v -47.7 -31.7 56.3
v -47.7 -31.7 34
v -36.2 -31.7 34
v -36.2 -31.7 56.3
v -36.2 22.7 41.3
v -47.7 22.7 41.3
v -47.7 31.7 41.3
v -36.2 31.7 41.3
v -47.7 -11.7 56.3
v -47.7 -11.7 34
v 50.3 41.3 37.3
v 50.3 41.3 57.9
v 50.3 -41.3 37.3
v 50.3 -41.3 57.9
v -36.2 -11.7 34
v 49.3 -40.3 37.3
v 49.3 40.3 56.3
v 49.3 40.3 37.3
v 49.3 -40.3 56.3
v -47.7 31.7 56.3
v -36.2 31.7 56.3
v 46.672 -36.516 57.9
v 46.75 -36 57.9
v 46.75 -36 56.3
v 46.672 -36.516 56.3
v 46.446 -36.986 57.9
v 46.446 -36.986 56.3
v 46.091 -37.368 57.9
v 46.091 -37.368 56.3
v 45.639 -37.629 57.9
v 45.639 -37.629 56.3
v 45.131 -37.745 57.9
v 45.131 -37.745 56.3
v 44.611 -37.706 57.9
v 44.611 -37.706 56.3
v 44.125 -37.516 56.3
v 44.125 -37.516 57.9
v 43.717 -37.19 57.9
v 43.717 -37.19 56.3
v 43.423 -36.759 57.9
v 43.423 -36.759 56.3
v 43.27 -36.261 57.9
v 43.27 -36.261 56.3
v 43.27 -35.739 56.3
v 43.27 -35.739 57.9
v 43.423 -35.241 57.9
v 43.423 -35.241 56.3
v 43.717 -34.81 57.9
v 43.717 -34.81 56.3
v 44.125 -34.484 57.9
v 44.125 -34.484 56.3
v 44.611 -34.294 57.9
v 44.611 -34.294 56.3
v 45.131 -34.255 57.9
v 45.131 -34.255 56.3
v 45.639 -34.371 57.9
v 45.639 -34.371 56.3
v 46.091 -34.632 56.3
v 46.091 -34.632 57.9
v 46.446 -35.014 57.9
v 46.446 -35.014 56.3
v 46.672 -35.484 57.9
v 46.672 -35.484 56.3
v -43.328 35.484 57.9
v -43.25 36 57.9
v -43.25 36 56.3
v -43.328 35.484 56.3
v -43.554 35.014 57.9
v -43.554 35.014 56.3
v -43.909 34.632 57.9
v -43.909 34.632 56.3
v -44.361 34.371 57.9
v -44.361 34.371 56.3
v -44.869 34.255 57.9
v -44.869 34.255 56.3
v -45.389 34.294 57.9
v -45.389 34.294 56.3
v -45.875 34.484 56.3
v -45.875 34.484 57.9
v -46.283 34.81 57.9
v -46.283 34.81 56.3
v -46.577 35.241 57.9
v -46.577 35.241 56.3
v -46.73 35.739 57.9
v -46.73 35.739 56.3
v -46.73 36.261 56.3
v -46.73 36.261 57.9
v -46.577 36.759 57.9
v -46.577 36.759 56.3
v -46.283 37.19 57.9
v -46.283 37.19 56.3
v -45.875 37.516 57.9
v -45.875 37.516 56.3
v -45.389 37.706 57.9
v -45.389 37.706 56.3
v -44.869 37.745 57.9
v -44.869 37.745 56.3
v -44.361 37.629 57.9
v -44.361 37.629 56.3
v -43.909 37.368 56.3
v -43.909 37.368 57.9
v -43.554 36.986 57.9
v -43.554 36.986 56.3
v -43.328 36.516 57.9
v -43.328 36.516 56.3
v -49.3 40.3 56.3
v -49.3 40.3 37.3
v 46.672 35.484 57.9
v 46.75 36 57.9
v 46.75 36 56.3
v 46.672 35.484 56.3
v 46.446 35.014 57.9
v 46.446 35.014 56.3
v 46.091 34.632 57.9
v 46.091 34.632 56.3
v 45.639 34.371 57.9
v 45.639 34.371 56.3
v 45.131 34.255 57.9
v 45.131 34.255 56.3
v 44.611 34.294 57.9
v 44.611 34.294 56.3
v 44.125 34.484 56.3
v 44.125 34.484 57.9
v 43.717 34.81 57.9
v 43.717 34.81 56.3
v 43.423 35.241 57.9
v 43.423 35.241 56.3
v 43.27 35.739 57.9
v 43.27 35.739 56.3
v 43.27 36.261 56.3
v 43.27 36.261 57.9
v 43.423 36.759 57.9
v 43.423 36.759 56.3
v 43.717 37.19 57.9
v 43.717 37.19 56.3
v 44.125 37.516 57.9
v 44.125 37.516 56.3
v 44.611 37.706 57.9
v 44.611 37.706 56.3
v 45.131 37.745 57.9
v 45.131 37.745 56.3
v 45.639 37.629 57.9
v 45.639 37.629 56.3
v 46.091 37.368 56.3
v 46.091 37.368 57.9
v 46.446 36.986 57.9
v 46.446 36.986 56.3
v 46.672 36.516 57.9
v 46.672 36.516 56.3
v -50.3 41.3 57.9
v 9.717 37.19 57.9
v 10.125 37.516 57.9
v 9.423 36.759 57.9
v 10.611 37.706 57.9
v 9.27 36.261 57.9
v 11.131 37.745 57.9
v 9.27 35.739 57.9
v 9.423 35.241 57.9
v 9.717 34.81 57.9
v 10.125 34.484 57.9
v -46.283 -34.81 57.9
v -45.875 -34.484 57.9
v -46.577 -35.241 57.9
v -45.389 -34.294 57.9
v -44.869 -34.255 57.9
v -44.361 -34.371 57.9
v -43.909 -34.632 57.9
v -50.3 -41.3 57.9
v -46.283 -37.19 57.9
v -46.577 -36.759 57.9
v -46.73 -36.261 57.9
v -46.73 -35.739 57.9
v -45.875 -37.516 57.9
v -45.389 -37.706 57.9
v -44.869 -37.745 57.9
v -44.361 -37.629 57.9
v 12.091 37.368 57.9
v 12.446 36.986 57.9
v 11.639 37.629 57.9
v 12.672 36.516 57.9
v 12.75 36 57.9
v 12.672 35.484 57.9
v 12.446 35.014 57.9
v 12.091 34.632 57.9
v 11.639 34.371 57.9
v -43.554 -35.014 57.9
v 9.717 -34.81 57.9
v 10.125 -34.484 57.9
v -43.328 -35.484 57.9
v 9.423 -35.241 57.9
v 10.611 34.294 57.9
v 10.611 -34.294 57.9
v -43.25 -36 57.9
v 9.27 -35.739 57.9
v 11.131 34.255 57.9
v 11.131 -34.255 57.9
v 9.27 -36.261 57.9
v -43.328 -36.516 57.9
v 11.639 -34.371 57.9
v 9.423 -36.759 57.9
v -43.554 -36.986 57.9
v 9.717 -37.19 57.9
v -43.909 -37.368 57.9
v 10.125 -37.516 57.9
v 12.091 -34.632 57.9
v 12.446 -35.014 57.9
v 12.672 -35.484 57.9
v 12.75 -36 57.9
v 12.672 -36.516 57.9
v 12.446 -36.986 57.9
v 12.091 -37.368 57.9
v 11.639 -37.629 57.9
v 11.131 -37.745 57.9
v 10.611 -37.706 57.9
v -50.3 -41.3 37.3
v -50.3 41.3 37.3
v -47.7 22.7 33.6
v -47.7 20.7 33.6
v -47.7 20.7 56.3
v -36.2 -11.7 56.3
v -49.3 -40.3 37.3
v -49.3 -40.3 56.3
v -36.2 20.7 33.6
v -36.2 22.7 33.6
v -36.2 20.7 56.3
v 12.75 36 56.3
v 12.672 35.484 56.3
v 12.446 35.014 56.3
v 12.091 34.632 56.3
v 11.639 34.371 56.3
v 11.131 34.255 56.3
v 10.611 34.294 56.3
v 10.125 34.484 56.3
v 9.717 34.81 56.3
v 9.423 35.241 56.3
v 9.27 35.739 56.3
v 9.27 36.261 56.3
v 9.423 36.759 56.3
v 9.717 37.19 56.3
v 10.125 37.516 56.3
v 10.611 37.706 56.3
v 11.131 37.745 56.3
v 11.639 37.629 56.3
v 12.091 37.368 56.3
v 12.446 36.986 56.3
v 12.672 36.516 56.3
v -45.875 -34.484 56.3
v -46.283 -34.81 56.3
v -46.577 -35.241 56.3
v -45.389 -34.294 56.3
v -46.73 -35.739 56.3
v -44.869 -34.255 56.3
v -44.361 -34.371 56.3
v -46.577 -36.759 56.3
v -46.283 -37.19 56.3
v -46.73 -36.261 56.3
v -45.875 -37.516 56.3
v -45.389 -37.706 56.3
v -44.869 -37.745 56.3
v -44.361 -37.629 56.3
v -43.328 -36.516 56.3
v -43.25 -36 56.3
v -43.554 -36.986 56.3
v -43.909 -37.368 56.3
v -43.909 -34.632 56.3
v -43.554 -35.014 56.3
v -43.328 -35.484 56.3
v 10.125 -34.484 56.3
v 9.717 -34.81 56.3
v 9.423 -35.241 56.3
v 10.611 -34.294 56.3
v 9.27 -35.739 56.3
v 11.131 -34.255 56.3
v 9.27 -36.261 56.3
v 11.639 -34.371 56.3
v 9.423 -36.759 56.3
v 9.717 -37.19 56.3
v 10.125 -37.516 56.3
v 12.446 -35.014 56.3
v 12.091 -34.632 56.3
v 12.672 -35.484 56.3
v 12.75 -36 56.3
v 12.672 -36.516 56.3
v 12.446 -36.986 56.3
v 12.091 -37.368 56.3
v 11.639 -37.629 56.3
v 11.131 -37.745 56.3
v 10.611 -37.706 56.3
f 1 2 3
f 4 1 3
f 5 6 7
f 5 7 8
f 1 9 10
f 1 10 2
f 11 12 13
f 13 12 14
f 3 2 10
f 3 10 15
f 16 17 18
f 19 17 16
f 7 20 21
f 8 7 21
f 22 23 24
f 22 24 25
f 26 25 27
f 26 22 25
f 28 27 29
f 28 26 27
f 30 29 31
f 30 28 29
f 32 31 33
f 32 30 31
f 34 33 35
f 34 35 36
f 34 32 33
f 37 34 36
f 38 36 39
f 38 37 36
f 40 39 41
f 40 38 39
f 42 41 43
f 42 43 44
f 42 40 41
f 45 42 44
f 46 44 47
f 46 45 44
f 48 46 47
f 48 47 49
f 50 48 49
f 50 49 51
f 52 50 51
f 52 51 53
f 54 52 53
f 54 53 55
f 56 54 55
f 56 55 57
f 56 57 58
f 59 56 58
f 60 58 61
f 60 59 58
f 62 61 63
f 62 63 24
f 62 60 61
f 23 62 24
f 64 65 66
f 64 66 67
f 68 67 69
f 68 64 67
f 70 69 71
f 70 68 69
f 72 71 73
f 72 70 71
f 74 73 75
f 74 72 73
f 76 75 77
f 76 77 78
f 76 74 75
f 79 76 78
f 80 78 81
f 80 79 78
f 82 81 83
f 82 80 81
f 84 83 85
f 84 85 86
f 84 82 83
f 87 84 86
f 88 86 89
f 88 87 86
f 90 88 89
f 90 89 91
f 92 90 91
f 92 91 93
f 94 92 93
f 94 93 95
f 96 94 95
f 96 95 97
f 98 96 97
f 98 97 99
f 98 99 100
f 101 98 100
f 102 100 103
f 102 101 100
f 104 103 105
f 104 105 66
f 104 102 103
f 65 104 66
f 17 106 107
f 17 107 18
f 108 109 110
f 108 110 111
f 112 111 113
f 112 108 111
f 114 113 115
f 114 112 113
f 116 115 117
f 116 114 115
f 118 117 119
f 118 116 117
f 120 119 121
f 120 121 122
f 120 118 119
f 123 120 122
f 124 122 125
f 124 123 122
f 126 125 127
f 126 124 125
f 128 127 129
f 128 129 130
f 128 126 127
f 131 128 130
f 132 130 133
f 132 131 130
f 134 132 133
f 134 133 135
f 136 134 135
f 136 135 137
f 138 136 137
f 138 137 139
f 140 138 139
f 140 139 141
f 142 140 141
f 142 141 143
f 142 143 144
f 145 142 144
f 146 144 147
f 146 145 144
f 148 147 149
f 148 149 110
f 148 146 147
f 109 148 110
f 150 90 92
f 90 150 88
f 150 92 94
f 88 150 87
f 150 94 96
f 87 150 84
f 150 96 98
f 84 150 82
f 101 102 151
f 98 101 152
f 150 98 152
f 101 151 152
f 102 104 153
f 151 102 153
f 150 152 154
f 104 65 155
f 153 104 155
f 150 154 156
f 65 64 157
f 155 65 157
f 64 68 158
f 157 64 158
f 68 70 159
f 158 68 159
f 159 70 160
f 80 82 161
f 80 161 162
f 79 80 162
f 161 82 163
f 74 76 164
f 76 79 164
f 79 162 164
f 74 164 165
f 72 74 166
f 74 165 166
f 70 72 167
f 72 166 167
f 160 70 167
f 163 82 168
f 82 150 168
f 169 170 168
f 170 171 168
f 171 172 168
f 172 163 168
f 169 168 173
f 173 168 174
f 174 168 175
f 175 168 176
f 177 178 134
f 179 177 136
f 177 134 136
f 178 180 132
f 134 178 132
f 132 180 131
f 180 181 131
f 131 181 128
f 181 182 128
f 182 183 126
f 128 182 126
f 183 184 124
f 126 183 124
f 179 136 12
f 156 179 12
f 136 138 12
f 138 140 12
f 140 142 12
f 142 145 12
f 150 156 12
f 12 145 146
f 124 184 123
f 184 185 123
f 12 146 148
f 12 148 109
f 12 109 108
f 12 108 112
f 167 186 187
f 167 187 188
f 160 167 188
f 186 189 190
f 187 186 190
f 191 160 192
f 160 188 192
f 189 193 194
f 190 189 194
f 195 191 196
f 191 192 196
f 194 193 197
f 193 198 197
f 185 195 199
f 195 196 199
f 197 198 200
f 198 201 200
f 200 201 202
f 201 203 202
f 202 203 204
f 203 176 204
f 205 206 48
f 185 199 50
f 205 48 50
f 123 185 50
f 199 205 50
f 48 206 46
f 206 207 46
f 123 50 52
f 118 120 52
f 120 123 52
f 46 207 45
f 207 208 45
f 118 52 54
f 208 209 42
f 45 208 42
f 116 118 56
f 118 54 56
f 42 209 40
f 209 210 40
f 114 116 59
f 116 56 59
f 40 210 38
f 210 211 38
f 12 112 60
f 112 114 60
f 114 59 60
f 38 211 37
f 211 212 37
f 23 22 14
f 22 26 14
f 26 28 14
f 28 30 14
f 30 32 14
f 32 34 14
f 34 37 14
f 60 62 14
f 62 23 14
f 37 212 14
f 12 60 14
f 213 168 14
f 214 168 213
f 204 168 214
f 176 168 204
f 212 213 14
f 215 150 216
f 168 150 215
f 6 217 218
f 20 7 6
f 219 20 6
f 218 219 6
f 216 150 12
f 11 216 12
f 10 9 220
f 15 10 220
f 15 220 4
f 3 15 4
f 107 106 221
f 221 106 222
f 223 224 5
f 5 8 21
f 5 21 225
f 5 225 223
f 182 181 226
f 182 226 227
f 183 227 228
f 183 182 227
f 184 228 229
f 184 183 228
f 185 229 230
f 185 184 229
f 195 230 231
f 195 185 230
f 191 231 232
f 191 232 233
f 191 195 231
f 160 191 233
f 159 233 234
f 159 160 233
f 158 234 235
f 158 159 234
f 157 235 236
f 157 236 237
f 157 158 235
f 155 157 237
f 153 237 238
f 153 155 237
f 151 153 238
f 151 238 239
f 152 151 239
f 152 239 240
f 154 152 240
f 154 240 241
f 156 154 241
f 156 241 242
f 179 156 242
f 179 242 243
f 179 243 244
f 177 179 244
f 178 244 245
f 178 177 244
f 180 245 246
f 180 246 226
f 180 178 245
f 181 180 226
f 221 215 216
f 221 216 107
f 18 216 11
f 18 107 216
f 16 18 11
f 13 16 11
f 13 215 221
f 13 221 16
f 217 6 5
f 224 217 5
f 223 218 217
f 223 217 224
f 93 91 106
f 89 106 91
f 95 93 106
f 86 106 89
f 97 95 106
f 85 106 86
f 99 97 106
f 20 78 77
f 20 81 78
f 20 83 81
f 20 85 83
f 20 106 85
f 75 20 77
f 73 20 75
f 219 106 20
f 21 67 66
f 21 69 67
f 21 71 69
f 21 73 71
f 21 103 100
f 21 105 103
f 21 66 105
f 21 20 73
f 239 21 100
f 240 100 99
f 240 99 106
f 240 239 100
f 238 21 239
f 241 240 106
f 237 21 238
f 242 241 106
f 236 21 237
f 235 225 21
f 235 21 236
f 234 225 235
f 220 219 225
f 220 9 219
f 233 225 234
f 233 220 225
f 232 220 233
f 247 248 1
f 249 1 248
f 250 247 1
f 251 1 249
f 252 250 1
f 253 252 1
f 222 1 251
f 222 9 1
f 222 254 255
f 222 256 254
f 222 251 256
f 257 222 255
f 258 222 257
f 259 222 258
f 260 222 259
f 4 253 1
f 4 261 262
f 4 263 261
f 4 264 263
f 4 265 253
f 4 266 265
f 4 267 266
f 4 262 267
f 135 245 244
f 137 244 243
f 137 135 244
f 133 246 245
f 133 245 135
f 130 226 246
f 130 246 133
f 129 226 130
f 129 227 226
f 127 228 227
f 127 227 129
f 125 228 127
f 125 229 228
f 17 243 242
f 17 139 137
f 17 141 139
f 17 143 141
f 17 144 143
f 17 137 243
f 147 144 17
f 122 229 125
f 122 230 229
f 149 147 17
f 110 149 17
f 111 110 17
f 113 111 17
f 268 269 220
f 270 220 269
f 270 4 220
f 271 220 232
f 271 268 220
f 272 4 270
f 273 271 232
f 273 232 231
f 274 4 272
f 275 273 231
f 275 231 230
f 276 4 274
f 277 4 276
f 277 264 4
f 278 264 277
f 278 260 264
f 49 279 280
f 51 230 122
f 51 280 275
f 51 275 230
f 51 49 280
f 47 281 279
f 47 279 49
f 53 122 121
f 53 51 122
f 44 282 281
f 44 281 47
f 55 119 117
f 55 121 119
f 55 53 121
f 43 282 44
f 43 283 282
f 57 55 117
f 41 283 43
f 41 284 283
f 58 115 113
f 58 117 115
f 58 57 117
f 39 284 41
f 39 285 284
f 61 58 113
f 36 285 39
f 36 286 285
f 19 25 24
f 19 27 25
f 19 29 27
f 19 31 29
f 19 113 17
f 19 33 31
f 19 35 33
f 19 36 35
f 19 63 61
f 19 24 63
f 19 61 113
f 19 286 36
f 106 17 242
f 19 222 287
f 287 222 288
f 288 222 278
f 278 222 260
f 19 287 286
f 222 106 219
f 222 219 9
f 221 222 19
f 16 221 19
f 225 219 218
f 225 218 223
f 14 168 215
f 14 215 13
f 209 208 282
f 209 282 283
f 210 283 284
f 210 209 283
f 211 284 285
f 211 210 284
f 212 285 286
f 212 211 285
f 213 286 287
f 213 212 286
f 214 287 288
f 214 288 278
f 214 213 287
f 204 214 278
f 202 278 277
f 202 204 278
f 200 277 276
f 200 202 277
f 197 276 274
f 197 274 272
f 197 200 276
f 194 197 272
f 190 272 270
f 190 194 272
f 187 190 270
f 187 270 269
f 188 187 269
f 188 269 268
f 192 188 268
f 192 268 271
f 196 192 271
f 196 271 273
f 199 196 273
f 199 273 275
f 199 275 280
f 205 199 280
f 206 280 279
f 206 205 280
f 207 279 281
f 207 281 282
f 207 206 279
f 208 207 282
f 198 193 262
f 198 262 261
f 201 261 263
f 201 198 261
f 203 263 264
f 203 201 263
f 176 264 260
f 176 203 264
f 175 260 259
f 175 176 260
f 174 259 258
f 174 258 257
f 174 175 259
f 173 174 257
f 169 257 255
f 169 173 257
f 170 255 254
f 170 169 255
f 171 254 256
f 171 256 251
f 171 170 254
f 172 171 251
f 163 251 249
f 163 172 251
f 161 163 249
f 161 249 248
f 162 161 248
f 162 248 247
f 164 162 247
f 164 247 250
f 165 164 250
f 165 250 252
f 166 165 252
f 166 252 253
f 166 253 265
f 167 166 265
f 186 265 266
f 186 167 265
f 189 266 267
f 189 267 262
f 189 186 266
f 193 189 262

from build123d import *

# Parameters (mm, degrees)
SKETCH009_W             = 100.6
SKETCH009_H             = 82.6
PAD006_DEPTH            = 1.6
SKETCH010_W             = 100.6
SKETCH010_H             = 82.6
SKETCH010_W_2           = 98.6
SKETCH010_H_2           = 80.6
PAD007_DEPTH            = 20.6
SKETCH011_W             = 11.5
SKETCH011_H             = 9
PAD008_DEPTH            = 16.6
SKETCH012_W             = 11.5
SKETCH012_H             = 2
PAD009_DEPTH            = 24.3
SKETCH014_R             = 1.75
POCKET004_DEPTH         = 1.6
SKETCH020_W             = 11.5
SKETCH020_H             = 20
PAD013_DEPTH            = 23.9
BODY003_PLACEMENT_ANGLE = 180


with BuildPart() as part:
    # Sketch009 → Pad006 (new body)
    with BuildSketch(Plane.XY):
        Rectangle(SKETCH009_W, SKETCH009_H)
    extrude(amount=PAD006_DEPTH)

    # Sketch010 → Pad007 (join)
    with BuildSketch(Plane.XY):
        Rectangle(SKETCH010_W, SKETCH010_H)
        Rectangle(SKETCH010_W_2, SKETCH010_H_2, mode=Mode.SUBTRACT)
    extrude(amount=PAD007_DEPTH)

    # Sketch011 → Pad008 (join)
    with BuildSketch(Plane.XY):
        with Locations((-41.95, -27.2)):
            Rectangle(SKETCH011_W, SKETCH011_H)
    extrude(amount=PAD008_DEPTH)

    # Sketch012 → Pad009 (join)
    with BuildSketch(Plane.XY):
        with Locations((-41.95, -21.7)):
            Rectangle(SKETCH012_W, SKETCH012_H)
    extrude(amount=PAD009_DEPTH)

    # Sketch014 → Pocket004 (cut)
    with BuildSketch(Plane.XY):
        with Locations((-45, 36)):
            Circle(SKETCH014_R)
        with Locations((11, 36)):
            Circle(SKETCH014_R)
        with Locations((45, 36)):
            Circle(SKETCH014_R)
        with Locations((45, -36)):
            Circle(SKETCH014_R)
        with Locations((11, -36)):
            Circle(SKETCH014_R)
        with Locations((-45, -36)):
            Circle(SKETCH014_R)
    extrude(amount=POCKET004_DEPTH, mode=Mode.SUBTRACT)

    # Sketch020 → Pad013 (join)
    with BuildSketch(Plane.XY):
        with Locations((-41.95, 21.7)):
            Rectangle(SKETCH020_W, SKETCH020_H)
    extrude(amount=PAD013_DEPTH)


with BuildPart() as part_1:
    # Body003 placement: moved
    add(part.part.moved(Location((0, 0, 57.9))).rotate(Axis((0, 0, 57.9), (1, 0, 0)), BODY003_PLACEMENT_ANGLE))


solid = part_1.part
